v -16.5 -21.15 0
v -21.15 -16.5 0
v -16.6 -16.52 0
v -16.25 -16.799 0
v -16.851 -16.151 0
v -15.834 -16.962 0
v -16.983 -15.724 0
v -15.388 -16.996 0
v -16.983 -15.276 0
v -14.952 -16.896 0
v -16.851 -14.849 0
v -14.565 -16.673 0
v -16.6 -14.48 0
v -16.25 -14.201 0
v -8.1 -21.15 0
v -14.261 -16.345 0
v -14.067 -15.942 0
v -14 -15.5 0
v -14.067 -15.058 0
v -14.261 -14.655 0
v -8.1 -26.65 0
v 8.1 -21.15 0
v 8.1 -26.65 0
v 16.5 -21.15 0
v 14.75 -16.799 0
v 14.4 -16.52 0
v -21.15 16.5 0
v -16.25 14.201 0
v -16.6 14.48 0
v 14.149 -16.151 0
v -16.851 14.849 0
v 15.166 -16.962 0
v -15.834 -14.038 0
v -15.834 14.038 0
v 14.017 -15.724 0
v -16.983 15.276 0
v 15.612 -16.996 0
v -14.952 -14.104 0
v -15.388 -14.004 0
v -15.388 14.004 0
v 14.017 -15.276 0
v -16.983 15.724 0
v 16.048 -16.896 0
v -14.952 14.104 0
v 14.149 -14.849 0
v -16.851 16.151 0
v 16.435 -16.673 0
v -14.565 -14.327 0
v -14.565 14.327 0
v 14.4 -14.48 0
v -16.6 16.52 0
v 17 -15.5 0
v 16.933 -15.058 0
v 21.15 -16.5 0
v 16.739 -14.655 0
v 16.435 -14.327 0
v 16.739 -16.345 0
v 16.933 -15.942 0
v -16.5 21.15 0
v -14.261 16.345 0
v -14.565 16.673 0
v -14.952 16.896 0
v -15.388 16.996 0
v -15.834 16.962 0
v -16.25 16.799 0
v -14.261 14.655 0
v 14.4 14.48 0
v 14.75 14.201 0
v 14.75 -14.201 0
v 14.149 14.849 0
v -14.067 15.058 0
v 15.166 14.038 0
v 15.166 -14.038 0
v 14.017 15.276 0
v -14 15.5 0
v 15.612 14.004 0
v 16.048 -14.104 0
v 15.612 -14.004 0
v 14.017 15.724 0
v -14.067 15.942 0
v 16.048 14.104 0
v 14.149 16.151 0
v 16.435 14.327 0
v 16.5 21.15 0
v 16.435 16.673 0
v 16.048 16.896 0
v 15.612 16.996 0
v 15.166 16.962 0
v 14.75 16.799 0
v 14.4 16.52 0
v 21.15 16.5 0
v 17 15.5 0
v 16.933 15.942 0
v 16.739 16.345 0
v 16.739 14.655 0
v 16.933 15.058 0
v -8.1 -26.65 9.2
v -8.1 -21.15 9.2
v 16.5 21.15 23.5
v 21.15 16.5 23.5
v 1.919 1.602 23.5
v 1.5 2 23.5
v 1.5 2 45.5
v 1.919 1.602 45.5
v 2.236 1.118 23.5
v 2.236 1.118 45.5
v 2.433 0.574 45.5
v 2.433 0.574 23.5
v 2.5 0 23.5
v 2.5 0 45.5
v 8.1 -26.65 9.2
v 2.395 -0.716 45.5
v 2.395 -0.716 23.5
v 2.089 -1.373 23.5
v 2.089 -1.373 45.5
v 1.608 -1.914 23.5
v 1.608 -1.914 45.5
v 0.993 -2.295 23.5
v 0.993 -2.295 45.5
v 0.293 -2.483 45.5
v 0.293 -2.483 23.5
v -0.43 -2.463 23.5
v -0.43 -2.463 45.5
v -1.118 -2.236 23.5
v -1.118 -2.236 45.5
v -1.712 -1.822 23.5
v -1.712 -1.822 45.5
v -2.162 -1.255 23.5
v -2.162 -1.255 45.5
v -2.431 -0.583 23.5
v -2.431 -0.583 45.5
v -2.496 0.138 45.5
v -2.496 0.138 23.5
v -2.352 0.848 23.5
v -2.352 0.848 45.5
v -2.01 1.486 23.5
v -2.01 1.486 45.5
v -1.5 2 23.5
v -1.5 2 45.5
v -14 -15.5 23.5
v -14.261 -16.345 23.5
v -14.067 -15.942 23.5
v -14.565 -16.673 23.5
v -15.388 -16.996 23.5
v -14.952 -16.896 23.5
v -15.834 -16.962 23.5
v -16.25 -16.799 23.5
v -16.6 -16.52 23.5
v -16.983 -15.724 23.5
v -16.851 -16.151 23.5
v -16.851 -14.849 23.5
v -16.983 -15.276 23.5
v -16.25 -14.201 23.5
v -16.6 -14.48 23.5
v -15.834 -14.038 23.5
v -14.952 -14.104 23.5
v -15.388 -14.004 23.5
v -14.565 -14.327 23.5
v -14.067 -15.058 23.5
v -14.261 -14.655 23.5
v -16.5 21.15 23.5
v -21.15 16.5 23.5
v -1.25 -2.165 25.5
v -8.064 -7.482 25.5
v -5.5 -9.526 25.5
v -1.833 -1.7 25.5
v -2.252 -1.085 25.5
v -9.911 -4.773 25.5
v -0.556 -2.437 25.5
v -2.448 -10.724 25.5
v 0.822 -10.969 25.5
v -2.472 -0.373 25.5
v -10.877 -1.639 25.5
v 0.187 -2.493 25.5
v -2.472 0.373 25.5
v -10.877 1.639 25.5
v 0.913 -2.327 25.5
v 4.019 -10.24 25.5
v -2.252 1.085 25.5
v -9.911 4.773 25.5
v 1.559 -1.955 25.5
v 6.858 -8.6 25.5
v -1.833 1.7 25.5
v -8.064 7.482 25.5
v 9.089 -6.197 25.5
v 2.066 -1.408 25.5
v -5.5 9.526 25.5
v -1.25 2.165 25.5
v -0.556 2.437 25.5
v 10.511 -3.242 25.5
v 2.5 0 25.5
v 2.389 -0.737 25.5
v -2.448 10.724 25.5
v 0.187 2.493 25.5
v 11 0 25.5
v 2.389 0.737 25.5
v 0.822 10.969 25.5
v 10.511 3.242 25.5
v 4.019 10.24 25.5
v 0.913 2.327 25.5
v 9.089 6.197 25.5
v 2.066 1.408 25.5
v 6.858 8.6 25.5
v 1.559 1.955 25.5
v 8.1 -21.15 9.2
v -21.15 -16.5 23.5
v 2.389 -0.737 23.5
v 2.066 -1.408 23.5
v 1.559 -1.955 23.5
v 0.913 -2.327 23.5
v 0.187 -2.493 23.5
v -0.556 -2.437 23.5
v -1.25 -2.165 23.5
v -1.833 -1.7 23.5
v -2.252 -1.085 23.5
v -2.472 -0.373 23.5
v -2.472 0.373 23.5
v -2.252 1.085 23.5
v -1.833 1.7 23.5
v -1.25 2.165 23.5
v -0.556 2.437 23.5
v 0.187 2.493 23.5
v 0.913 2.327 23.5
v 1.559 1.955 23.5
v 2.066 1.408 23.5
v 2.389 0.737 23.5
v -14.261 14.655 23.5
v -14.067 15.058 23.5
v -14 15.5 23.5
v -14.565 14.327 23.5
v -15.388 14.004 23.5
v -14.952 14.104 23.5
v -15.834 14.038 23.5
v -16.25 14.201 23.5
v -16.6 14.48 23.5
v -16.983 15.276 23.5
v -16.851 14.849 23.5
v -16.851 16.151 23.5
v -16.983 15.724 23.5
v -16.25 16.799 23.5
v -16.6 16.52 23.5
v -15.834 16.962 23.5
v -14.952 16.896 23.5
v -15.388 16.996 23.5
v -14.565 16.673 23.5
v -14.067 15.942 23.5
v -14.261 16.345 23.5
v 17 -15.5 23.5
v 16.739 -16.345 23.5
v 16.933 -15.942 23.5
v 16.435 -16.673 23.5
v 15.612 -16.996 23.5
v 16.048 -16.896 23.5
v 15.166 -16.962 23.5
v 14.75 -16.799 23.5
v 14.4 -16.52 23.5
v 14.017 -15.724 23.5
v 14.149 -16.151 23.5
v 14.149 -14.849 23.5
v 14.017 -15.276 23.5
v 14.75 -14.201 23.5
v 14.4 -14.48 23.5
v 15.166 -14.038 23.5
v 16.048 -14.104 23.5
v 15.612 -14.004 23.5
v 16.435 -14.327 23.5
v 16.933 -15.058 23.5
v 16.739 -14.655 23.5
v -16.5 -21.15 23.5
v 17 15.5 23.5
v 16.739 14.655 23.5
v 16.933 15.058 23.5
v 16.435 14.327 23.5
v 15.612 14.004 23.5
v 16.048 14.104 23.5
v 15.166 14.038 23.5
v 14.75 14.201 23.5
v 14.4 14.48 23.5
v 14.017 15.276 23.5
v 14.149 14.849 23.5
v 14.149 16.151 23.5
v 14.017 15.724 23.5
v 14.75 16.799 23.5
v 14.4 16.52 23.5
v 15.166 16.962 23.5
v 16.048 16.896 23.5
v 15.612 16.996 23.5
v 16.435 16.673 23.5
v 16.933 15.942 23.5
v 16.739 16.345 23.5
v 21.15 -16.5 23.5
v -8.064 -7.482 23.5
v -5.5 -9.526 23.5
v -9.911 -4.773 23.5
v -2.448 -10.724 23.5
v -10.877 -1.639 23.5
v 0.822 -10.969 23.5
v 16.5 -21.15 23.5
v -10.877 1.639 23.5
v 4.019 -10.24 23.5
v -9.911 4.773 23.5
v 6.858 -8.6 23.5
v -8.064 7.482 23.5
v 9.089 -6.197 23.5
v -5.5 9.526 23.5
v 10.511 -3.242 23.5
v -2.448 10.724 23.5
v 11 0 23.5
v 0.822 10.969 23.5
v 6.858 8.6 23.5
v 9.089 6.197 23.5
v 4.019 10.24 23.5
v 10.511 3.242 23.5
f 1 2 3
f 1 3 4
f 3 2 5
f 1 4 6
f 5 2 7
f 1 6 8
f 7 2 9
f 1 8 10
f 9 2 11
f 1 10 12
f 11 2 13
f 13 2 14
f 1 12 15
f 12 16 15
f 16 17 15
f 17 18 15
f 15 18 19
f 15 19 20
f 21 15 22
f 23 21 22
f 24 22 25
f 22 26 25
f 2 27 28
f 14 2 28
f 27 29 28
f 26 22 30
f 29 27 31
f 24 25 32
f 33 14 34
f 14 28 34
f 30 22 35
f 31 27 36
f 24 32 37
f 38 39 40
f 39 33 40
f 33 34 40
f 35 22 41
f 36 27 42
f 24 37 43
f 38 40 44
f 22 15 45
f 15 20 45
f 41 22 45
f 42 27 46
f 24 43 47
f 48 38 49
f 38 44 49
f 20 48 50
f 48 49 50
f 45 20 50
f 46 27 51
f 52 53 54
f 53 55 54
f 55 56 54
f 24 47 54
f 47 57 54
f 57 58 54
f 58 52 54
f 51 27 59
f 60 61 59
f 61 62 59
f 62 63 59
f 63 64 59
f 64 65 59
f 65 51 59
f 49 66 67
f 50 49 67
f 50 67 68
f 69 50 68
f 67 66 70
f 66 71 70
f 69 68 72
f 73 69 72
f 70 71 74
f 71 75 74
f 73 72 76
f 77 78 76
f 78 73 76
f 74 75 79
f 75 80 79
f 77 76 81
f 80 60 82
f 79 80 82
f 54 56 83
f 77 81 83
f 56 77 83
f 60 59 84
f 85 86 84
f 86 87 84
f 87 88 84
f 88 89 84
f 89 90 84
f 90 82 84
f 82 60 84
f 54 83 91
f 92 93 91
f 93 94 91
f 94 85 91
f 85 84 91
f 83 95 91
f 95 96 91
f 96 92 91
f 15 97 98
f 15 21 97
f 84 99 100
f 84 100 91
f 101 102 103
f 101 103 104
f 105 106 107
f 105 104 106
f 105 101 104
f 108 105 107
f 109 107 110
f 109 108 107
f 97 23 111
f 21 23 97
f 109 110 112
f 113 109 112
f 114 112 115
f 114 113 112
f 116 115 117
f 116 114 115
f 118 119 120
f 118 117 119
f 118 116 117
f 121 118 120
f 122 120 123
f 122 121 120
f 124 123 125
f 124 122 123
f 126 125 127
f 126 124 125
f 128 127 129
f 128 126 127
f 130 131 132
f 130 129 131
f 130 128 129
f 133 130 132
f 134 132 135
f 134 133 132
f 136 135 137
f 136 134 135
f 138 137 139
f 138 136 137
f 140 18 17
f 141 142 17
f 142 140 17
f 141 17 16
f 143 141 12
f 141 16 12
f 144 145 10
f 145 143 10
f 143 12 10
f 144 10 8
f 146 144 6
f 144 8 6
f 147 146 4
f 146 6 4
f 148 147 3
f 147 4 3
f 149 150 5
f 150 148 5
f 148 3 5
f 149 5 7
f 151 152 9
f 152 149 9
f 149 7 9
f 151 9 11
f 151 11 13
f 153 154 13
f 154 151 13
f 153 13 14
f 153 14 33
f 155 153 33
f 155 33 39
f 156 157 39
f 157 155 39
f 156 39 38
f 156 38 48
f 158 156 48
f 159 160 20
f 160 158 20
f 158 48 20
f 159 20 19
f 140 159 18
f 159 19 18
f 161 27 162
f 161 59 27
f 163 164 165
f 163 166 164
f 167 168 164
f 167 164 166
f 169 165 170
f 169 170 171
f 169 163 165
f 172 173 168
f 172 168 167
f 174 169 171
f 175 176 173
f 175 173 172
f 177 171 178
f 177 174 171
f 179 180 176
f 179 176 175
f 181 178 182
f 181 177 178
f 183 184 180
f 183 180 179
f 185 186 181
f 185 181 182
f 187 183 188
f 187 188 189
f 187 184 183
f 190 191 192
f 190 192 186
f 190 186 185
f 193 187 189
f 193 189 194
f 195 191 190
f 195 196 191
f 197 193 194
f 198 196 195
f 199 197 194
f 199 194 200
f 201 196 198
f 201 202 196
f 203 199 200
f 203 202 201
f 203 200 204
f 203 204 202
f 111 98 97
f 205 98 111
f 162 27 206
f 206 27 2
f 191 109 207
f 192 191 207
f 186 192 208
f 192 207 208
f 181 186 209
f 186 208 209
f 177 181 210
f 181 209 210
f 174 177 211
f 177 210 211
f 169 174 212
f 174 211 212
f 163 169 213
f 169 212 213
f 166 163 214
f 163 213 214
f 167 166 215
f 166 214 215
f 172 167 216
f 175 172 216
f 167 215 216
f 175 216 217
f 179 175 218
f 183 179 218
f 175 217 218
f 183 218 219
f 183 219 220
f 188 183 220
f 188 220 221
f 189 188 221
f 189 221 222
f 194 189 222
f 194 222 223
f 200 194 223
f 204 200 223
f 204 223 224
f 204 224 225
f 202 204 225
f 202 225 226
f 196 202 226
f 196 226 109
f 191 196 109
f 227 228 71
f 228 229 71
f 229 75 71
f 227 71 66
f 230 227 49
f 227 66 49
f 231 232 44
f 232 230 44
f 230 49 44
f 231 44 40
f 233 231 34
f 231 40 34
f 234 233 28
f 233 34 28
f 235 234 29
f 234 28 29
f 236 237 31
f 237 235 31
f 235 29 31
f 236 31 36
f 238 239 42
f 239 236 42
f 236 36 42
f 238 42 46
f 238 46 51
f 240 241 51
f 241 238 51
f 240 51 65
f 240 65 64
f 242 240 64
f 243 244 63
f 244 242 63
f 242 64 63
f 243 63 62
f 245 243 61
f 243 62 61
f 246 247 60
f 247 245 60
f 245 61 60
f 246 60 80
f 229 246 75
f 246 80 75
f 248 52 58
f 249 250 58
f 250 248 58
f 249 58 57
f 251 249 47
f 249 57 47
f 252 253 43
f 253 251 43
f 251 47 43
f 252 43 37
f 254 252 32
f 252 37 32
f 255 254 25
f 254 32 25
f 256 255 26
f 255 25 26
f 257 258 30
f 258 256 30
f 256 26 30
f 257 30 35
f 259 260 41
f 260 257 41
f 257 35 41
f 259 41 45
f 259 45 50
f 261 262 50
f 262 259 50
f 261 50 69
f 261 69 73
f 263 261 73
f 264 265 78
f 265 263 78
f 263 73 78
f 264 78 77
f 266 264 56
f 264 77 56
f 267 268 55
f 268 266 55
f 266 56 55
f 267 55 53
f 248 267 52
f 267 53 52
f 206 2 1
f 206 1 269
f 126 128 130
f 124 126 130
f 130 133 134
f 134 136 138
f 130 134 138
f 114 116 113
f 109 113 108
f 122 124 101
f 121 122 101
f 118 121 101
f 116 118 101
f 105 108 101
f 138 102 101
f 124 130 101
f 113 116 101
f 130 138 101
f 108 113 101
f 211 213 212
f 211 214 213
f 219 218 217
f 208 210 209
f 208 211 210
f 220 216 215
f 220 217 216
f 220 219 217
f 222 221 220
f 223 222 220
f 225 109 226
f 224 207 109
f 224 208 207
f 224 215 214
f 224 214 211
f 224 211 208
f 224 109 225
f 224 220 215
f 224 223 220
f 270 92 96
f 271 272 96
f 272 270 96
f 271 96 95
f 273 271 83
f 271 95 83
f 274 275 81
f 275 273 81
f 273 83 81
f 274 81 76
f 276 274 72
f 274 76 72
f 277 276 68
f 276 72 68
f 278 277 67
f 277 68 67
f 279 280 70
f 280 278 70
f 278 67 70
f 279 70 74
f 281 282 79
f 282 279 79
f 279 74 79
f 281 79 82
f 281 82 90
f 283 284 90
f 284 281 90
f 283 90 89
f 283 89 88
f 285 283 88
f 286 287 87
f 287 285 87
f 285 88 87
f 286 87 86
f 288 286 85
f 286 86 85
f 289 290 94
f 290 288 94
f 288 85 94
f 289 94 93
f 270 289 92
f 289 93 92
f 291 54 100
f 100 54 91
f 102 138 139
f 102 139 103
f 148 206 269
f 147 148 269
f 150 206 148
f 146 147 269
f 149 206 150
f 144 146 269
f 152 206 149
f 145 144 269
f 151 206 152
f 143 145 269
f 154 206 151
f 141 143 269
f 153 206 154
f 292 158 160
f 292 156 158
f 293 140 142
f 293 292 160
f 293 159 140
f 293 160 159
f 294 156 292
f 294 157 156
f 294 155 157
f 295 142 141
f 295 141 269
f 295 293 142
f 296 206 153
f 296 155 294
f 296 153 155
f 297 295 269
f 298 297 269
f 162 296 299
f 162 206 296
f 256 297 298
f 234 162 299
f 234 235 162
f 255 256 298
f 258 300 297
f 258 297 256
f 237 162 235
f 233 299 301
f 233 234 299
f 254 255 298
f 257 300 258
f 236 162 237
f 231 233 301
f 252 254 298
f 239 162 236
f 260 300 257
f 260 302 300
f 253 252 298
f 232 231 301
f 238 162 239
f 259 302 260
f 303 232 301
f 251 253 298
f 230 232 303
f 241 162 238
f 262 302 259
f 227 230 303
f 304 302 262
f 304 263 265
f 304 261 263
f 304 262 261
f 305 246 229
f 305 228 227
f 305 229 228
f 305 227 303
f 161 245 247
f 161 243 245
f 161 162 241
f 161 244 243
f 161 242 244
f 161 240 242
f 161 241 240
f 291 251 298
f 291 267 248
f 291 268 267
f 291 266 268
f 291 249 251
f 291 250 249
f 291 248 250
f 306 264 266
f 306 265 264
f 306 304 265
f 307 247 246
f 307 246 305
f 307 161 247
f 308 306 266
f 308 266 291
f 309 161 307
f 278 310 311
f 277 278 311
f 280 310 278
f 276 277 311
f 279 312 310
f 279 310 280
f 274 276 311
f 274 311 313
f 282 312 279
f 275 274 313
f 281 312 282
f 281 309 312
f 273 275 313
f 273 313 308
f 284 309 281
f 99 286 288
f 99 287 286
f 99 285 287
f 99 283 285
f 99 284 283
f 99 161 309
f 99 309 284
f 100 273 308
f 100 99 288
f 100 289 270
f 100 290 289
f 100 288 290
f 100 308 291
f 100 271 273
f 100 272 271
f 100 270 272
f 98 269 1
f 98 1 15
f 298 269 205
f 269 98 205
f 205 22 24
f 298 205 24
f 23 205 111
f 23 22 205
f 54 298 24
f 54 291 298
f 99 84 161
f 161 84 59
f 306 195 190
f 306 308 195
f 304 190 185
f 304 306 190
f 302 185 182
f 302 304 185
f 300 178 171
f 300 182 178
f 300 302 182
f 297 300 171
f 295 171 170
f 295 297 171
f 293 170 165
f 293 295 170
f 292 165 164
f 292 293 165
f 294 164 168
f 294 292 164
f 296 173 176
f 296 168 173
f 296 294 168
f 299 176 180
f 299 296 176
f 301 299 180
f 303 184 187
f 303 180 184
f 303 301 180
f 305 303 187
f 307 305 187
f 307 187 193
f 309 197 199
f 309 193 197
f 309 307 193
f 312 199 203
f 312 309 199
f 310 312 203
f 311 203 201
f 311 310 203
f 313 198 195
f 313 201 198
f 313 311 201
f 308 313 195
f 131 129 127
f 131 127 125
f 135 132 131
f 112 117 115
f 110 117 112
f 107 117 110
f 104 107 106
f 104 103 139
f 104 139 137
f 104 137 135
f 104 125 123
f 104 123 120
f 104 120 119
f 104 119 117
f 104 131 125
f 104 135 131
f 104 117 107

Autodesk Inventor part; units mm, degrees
ref_plane "YZ Plane" through (0, 0, 0) normal (1, 0, 0) x (0, 1, 0)
ref_plane "XZ Plane" through (0, 0, 0) normal (0, 1, 0) x (-1, 0, 0)
ref_plane "XY Plane" through (0, 0, 0) normal (0, 0, 1) x (1, 0, 0)
sketch "Эскиз1" plane through (0, 0, 0) normal (0, 0, 1) x (1, 0, 0)
  line L0 (-21.15, -21.15) -> (21.15, -21.15)
  line L1 (21.15, -21.15) -> (21.15, 21.15)
  line L2 (21.15, 21.15) -> (-21.15, 21.15)
  line L3 (-21.15, 21.15) -> (-21.15, -21.15)
  line L4 (-21.15, -21.15) -> (21.15, 21.15) construction
  line L5 (21.15, -21.15) -> (-21.15, 21.15) construction
  circle A0 centre (-15.5, 15.5) radius 1.5
  line L6 (0, 0) -> (0, 3.5329)
  line L7 (0, 0) -> (3.0649, 0)
  circle A1 centre (15.5, 15.5) radius 1.5
  circle A2 centre (15.5, -15.5) radius 1.5
  circle A3 centre (-15.5, -15.5) radius 1.5
  line L8 (-8.1, -21.15) -> (8.1, -21.15)
  line L9 (8.1, -21.15) -> (8.1, -26.65)
  line L10 (8.1, -26.65) -> (-8.1, -26.65)
  line L11 (-8.1, -26.65) -> (-8.1, -21.15)
  point P0 (0, -26.65)
  dimension "d3" = 42.3
  dimension "d7" = 3
  dimension "d11" = 31
  dimension "d12" = 31
  dimension "d13" = 16.2
  dimension "d14" = 5.5
extrude "Выдавливание1" add sketch "Эскиз1" along normal blind 9.2 contours L0 L9 L10 L11
extrude "Выдавливание2" add sketch "Эскиз1" along normal blind 23.5 contours L3 L2 L1 L0
sketch "Эскиз2" plane through (0, 0, 23.5) normal (0, 0, 1) x (1, 0, 0)
  circle A0 centre (0, 0) radius 11
  circle A1 centre (0, 0) radius 2.5
  line L0 (-1.5, 2) -> (1.5, 2)
  point P0 (0, 2)
  dimension "d19" = 22
  dimension "d20" = 5
  dimension "d21" = 4.5
extrude "Выдавливание3" add sketch "Эскиз2" along normal blind 2
extrude "Выдавливание4" add sketch "Эскиз2" along normal blind 22 separate body contours A1 L0 picked at (0.1119, 0.5076)
chamfer "Фаска1" distance 4.65 angle 45 4 edges at (-21.15, 21.15, 11.75) (21.15, 21.15, 11.75) (-21.15, -21.15, 11.75) (21.15, -21.15, 11.75)
properties part number "Мотор"
